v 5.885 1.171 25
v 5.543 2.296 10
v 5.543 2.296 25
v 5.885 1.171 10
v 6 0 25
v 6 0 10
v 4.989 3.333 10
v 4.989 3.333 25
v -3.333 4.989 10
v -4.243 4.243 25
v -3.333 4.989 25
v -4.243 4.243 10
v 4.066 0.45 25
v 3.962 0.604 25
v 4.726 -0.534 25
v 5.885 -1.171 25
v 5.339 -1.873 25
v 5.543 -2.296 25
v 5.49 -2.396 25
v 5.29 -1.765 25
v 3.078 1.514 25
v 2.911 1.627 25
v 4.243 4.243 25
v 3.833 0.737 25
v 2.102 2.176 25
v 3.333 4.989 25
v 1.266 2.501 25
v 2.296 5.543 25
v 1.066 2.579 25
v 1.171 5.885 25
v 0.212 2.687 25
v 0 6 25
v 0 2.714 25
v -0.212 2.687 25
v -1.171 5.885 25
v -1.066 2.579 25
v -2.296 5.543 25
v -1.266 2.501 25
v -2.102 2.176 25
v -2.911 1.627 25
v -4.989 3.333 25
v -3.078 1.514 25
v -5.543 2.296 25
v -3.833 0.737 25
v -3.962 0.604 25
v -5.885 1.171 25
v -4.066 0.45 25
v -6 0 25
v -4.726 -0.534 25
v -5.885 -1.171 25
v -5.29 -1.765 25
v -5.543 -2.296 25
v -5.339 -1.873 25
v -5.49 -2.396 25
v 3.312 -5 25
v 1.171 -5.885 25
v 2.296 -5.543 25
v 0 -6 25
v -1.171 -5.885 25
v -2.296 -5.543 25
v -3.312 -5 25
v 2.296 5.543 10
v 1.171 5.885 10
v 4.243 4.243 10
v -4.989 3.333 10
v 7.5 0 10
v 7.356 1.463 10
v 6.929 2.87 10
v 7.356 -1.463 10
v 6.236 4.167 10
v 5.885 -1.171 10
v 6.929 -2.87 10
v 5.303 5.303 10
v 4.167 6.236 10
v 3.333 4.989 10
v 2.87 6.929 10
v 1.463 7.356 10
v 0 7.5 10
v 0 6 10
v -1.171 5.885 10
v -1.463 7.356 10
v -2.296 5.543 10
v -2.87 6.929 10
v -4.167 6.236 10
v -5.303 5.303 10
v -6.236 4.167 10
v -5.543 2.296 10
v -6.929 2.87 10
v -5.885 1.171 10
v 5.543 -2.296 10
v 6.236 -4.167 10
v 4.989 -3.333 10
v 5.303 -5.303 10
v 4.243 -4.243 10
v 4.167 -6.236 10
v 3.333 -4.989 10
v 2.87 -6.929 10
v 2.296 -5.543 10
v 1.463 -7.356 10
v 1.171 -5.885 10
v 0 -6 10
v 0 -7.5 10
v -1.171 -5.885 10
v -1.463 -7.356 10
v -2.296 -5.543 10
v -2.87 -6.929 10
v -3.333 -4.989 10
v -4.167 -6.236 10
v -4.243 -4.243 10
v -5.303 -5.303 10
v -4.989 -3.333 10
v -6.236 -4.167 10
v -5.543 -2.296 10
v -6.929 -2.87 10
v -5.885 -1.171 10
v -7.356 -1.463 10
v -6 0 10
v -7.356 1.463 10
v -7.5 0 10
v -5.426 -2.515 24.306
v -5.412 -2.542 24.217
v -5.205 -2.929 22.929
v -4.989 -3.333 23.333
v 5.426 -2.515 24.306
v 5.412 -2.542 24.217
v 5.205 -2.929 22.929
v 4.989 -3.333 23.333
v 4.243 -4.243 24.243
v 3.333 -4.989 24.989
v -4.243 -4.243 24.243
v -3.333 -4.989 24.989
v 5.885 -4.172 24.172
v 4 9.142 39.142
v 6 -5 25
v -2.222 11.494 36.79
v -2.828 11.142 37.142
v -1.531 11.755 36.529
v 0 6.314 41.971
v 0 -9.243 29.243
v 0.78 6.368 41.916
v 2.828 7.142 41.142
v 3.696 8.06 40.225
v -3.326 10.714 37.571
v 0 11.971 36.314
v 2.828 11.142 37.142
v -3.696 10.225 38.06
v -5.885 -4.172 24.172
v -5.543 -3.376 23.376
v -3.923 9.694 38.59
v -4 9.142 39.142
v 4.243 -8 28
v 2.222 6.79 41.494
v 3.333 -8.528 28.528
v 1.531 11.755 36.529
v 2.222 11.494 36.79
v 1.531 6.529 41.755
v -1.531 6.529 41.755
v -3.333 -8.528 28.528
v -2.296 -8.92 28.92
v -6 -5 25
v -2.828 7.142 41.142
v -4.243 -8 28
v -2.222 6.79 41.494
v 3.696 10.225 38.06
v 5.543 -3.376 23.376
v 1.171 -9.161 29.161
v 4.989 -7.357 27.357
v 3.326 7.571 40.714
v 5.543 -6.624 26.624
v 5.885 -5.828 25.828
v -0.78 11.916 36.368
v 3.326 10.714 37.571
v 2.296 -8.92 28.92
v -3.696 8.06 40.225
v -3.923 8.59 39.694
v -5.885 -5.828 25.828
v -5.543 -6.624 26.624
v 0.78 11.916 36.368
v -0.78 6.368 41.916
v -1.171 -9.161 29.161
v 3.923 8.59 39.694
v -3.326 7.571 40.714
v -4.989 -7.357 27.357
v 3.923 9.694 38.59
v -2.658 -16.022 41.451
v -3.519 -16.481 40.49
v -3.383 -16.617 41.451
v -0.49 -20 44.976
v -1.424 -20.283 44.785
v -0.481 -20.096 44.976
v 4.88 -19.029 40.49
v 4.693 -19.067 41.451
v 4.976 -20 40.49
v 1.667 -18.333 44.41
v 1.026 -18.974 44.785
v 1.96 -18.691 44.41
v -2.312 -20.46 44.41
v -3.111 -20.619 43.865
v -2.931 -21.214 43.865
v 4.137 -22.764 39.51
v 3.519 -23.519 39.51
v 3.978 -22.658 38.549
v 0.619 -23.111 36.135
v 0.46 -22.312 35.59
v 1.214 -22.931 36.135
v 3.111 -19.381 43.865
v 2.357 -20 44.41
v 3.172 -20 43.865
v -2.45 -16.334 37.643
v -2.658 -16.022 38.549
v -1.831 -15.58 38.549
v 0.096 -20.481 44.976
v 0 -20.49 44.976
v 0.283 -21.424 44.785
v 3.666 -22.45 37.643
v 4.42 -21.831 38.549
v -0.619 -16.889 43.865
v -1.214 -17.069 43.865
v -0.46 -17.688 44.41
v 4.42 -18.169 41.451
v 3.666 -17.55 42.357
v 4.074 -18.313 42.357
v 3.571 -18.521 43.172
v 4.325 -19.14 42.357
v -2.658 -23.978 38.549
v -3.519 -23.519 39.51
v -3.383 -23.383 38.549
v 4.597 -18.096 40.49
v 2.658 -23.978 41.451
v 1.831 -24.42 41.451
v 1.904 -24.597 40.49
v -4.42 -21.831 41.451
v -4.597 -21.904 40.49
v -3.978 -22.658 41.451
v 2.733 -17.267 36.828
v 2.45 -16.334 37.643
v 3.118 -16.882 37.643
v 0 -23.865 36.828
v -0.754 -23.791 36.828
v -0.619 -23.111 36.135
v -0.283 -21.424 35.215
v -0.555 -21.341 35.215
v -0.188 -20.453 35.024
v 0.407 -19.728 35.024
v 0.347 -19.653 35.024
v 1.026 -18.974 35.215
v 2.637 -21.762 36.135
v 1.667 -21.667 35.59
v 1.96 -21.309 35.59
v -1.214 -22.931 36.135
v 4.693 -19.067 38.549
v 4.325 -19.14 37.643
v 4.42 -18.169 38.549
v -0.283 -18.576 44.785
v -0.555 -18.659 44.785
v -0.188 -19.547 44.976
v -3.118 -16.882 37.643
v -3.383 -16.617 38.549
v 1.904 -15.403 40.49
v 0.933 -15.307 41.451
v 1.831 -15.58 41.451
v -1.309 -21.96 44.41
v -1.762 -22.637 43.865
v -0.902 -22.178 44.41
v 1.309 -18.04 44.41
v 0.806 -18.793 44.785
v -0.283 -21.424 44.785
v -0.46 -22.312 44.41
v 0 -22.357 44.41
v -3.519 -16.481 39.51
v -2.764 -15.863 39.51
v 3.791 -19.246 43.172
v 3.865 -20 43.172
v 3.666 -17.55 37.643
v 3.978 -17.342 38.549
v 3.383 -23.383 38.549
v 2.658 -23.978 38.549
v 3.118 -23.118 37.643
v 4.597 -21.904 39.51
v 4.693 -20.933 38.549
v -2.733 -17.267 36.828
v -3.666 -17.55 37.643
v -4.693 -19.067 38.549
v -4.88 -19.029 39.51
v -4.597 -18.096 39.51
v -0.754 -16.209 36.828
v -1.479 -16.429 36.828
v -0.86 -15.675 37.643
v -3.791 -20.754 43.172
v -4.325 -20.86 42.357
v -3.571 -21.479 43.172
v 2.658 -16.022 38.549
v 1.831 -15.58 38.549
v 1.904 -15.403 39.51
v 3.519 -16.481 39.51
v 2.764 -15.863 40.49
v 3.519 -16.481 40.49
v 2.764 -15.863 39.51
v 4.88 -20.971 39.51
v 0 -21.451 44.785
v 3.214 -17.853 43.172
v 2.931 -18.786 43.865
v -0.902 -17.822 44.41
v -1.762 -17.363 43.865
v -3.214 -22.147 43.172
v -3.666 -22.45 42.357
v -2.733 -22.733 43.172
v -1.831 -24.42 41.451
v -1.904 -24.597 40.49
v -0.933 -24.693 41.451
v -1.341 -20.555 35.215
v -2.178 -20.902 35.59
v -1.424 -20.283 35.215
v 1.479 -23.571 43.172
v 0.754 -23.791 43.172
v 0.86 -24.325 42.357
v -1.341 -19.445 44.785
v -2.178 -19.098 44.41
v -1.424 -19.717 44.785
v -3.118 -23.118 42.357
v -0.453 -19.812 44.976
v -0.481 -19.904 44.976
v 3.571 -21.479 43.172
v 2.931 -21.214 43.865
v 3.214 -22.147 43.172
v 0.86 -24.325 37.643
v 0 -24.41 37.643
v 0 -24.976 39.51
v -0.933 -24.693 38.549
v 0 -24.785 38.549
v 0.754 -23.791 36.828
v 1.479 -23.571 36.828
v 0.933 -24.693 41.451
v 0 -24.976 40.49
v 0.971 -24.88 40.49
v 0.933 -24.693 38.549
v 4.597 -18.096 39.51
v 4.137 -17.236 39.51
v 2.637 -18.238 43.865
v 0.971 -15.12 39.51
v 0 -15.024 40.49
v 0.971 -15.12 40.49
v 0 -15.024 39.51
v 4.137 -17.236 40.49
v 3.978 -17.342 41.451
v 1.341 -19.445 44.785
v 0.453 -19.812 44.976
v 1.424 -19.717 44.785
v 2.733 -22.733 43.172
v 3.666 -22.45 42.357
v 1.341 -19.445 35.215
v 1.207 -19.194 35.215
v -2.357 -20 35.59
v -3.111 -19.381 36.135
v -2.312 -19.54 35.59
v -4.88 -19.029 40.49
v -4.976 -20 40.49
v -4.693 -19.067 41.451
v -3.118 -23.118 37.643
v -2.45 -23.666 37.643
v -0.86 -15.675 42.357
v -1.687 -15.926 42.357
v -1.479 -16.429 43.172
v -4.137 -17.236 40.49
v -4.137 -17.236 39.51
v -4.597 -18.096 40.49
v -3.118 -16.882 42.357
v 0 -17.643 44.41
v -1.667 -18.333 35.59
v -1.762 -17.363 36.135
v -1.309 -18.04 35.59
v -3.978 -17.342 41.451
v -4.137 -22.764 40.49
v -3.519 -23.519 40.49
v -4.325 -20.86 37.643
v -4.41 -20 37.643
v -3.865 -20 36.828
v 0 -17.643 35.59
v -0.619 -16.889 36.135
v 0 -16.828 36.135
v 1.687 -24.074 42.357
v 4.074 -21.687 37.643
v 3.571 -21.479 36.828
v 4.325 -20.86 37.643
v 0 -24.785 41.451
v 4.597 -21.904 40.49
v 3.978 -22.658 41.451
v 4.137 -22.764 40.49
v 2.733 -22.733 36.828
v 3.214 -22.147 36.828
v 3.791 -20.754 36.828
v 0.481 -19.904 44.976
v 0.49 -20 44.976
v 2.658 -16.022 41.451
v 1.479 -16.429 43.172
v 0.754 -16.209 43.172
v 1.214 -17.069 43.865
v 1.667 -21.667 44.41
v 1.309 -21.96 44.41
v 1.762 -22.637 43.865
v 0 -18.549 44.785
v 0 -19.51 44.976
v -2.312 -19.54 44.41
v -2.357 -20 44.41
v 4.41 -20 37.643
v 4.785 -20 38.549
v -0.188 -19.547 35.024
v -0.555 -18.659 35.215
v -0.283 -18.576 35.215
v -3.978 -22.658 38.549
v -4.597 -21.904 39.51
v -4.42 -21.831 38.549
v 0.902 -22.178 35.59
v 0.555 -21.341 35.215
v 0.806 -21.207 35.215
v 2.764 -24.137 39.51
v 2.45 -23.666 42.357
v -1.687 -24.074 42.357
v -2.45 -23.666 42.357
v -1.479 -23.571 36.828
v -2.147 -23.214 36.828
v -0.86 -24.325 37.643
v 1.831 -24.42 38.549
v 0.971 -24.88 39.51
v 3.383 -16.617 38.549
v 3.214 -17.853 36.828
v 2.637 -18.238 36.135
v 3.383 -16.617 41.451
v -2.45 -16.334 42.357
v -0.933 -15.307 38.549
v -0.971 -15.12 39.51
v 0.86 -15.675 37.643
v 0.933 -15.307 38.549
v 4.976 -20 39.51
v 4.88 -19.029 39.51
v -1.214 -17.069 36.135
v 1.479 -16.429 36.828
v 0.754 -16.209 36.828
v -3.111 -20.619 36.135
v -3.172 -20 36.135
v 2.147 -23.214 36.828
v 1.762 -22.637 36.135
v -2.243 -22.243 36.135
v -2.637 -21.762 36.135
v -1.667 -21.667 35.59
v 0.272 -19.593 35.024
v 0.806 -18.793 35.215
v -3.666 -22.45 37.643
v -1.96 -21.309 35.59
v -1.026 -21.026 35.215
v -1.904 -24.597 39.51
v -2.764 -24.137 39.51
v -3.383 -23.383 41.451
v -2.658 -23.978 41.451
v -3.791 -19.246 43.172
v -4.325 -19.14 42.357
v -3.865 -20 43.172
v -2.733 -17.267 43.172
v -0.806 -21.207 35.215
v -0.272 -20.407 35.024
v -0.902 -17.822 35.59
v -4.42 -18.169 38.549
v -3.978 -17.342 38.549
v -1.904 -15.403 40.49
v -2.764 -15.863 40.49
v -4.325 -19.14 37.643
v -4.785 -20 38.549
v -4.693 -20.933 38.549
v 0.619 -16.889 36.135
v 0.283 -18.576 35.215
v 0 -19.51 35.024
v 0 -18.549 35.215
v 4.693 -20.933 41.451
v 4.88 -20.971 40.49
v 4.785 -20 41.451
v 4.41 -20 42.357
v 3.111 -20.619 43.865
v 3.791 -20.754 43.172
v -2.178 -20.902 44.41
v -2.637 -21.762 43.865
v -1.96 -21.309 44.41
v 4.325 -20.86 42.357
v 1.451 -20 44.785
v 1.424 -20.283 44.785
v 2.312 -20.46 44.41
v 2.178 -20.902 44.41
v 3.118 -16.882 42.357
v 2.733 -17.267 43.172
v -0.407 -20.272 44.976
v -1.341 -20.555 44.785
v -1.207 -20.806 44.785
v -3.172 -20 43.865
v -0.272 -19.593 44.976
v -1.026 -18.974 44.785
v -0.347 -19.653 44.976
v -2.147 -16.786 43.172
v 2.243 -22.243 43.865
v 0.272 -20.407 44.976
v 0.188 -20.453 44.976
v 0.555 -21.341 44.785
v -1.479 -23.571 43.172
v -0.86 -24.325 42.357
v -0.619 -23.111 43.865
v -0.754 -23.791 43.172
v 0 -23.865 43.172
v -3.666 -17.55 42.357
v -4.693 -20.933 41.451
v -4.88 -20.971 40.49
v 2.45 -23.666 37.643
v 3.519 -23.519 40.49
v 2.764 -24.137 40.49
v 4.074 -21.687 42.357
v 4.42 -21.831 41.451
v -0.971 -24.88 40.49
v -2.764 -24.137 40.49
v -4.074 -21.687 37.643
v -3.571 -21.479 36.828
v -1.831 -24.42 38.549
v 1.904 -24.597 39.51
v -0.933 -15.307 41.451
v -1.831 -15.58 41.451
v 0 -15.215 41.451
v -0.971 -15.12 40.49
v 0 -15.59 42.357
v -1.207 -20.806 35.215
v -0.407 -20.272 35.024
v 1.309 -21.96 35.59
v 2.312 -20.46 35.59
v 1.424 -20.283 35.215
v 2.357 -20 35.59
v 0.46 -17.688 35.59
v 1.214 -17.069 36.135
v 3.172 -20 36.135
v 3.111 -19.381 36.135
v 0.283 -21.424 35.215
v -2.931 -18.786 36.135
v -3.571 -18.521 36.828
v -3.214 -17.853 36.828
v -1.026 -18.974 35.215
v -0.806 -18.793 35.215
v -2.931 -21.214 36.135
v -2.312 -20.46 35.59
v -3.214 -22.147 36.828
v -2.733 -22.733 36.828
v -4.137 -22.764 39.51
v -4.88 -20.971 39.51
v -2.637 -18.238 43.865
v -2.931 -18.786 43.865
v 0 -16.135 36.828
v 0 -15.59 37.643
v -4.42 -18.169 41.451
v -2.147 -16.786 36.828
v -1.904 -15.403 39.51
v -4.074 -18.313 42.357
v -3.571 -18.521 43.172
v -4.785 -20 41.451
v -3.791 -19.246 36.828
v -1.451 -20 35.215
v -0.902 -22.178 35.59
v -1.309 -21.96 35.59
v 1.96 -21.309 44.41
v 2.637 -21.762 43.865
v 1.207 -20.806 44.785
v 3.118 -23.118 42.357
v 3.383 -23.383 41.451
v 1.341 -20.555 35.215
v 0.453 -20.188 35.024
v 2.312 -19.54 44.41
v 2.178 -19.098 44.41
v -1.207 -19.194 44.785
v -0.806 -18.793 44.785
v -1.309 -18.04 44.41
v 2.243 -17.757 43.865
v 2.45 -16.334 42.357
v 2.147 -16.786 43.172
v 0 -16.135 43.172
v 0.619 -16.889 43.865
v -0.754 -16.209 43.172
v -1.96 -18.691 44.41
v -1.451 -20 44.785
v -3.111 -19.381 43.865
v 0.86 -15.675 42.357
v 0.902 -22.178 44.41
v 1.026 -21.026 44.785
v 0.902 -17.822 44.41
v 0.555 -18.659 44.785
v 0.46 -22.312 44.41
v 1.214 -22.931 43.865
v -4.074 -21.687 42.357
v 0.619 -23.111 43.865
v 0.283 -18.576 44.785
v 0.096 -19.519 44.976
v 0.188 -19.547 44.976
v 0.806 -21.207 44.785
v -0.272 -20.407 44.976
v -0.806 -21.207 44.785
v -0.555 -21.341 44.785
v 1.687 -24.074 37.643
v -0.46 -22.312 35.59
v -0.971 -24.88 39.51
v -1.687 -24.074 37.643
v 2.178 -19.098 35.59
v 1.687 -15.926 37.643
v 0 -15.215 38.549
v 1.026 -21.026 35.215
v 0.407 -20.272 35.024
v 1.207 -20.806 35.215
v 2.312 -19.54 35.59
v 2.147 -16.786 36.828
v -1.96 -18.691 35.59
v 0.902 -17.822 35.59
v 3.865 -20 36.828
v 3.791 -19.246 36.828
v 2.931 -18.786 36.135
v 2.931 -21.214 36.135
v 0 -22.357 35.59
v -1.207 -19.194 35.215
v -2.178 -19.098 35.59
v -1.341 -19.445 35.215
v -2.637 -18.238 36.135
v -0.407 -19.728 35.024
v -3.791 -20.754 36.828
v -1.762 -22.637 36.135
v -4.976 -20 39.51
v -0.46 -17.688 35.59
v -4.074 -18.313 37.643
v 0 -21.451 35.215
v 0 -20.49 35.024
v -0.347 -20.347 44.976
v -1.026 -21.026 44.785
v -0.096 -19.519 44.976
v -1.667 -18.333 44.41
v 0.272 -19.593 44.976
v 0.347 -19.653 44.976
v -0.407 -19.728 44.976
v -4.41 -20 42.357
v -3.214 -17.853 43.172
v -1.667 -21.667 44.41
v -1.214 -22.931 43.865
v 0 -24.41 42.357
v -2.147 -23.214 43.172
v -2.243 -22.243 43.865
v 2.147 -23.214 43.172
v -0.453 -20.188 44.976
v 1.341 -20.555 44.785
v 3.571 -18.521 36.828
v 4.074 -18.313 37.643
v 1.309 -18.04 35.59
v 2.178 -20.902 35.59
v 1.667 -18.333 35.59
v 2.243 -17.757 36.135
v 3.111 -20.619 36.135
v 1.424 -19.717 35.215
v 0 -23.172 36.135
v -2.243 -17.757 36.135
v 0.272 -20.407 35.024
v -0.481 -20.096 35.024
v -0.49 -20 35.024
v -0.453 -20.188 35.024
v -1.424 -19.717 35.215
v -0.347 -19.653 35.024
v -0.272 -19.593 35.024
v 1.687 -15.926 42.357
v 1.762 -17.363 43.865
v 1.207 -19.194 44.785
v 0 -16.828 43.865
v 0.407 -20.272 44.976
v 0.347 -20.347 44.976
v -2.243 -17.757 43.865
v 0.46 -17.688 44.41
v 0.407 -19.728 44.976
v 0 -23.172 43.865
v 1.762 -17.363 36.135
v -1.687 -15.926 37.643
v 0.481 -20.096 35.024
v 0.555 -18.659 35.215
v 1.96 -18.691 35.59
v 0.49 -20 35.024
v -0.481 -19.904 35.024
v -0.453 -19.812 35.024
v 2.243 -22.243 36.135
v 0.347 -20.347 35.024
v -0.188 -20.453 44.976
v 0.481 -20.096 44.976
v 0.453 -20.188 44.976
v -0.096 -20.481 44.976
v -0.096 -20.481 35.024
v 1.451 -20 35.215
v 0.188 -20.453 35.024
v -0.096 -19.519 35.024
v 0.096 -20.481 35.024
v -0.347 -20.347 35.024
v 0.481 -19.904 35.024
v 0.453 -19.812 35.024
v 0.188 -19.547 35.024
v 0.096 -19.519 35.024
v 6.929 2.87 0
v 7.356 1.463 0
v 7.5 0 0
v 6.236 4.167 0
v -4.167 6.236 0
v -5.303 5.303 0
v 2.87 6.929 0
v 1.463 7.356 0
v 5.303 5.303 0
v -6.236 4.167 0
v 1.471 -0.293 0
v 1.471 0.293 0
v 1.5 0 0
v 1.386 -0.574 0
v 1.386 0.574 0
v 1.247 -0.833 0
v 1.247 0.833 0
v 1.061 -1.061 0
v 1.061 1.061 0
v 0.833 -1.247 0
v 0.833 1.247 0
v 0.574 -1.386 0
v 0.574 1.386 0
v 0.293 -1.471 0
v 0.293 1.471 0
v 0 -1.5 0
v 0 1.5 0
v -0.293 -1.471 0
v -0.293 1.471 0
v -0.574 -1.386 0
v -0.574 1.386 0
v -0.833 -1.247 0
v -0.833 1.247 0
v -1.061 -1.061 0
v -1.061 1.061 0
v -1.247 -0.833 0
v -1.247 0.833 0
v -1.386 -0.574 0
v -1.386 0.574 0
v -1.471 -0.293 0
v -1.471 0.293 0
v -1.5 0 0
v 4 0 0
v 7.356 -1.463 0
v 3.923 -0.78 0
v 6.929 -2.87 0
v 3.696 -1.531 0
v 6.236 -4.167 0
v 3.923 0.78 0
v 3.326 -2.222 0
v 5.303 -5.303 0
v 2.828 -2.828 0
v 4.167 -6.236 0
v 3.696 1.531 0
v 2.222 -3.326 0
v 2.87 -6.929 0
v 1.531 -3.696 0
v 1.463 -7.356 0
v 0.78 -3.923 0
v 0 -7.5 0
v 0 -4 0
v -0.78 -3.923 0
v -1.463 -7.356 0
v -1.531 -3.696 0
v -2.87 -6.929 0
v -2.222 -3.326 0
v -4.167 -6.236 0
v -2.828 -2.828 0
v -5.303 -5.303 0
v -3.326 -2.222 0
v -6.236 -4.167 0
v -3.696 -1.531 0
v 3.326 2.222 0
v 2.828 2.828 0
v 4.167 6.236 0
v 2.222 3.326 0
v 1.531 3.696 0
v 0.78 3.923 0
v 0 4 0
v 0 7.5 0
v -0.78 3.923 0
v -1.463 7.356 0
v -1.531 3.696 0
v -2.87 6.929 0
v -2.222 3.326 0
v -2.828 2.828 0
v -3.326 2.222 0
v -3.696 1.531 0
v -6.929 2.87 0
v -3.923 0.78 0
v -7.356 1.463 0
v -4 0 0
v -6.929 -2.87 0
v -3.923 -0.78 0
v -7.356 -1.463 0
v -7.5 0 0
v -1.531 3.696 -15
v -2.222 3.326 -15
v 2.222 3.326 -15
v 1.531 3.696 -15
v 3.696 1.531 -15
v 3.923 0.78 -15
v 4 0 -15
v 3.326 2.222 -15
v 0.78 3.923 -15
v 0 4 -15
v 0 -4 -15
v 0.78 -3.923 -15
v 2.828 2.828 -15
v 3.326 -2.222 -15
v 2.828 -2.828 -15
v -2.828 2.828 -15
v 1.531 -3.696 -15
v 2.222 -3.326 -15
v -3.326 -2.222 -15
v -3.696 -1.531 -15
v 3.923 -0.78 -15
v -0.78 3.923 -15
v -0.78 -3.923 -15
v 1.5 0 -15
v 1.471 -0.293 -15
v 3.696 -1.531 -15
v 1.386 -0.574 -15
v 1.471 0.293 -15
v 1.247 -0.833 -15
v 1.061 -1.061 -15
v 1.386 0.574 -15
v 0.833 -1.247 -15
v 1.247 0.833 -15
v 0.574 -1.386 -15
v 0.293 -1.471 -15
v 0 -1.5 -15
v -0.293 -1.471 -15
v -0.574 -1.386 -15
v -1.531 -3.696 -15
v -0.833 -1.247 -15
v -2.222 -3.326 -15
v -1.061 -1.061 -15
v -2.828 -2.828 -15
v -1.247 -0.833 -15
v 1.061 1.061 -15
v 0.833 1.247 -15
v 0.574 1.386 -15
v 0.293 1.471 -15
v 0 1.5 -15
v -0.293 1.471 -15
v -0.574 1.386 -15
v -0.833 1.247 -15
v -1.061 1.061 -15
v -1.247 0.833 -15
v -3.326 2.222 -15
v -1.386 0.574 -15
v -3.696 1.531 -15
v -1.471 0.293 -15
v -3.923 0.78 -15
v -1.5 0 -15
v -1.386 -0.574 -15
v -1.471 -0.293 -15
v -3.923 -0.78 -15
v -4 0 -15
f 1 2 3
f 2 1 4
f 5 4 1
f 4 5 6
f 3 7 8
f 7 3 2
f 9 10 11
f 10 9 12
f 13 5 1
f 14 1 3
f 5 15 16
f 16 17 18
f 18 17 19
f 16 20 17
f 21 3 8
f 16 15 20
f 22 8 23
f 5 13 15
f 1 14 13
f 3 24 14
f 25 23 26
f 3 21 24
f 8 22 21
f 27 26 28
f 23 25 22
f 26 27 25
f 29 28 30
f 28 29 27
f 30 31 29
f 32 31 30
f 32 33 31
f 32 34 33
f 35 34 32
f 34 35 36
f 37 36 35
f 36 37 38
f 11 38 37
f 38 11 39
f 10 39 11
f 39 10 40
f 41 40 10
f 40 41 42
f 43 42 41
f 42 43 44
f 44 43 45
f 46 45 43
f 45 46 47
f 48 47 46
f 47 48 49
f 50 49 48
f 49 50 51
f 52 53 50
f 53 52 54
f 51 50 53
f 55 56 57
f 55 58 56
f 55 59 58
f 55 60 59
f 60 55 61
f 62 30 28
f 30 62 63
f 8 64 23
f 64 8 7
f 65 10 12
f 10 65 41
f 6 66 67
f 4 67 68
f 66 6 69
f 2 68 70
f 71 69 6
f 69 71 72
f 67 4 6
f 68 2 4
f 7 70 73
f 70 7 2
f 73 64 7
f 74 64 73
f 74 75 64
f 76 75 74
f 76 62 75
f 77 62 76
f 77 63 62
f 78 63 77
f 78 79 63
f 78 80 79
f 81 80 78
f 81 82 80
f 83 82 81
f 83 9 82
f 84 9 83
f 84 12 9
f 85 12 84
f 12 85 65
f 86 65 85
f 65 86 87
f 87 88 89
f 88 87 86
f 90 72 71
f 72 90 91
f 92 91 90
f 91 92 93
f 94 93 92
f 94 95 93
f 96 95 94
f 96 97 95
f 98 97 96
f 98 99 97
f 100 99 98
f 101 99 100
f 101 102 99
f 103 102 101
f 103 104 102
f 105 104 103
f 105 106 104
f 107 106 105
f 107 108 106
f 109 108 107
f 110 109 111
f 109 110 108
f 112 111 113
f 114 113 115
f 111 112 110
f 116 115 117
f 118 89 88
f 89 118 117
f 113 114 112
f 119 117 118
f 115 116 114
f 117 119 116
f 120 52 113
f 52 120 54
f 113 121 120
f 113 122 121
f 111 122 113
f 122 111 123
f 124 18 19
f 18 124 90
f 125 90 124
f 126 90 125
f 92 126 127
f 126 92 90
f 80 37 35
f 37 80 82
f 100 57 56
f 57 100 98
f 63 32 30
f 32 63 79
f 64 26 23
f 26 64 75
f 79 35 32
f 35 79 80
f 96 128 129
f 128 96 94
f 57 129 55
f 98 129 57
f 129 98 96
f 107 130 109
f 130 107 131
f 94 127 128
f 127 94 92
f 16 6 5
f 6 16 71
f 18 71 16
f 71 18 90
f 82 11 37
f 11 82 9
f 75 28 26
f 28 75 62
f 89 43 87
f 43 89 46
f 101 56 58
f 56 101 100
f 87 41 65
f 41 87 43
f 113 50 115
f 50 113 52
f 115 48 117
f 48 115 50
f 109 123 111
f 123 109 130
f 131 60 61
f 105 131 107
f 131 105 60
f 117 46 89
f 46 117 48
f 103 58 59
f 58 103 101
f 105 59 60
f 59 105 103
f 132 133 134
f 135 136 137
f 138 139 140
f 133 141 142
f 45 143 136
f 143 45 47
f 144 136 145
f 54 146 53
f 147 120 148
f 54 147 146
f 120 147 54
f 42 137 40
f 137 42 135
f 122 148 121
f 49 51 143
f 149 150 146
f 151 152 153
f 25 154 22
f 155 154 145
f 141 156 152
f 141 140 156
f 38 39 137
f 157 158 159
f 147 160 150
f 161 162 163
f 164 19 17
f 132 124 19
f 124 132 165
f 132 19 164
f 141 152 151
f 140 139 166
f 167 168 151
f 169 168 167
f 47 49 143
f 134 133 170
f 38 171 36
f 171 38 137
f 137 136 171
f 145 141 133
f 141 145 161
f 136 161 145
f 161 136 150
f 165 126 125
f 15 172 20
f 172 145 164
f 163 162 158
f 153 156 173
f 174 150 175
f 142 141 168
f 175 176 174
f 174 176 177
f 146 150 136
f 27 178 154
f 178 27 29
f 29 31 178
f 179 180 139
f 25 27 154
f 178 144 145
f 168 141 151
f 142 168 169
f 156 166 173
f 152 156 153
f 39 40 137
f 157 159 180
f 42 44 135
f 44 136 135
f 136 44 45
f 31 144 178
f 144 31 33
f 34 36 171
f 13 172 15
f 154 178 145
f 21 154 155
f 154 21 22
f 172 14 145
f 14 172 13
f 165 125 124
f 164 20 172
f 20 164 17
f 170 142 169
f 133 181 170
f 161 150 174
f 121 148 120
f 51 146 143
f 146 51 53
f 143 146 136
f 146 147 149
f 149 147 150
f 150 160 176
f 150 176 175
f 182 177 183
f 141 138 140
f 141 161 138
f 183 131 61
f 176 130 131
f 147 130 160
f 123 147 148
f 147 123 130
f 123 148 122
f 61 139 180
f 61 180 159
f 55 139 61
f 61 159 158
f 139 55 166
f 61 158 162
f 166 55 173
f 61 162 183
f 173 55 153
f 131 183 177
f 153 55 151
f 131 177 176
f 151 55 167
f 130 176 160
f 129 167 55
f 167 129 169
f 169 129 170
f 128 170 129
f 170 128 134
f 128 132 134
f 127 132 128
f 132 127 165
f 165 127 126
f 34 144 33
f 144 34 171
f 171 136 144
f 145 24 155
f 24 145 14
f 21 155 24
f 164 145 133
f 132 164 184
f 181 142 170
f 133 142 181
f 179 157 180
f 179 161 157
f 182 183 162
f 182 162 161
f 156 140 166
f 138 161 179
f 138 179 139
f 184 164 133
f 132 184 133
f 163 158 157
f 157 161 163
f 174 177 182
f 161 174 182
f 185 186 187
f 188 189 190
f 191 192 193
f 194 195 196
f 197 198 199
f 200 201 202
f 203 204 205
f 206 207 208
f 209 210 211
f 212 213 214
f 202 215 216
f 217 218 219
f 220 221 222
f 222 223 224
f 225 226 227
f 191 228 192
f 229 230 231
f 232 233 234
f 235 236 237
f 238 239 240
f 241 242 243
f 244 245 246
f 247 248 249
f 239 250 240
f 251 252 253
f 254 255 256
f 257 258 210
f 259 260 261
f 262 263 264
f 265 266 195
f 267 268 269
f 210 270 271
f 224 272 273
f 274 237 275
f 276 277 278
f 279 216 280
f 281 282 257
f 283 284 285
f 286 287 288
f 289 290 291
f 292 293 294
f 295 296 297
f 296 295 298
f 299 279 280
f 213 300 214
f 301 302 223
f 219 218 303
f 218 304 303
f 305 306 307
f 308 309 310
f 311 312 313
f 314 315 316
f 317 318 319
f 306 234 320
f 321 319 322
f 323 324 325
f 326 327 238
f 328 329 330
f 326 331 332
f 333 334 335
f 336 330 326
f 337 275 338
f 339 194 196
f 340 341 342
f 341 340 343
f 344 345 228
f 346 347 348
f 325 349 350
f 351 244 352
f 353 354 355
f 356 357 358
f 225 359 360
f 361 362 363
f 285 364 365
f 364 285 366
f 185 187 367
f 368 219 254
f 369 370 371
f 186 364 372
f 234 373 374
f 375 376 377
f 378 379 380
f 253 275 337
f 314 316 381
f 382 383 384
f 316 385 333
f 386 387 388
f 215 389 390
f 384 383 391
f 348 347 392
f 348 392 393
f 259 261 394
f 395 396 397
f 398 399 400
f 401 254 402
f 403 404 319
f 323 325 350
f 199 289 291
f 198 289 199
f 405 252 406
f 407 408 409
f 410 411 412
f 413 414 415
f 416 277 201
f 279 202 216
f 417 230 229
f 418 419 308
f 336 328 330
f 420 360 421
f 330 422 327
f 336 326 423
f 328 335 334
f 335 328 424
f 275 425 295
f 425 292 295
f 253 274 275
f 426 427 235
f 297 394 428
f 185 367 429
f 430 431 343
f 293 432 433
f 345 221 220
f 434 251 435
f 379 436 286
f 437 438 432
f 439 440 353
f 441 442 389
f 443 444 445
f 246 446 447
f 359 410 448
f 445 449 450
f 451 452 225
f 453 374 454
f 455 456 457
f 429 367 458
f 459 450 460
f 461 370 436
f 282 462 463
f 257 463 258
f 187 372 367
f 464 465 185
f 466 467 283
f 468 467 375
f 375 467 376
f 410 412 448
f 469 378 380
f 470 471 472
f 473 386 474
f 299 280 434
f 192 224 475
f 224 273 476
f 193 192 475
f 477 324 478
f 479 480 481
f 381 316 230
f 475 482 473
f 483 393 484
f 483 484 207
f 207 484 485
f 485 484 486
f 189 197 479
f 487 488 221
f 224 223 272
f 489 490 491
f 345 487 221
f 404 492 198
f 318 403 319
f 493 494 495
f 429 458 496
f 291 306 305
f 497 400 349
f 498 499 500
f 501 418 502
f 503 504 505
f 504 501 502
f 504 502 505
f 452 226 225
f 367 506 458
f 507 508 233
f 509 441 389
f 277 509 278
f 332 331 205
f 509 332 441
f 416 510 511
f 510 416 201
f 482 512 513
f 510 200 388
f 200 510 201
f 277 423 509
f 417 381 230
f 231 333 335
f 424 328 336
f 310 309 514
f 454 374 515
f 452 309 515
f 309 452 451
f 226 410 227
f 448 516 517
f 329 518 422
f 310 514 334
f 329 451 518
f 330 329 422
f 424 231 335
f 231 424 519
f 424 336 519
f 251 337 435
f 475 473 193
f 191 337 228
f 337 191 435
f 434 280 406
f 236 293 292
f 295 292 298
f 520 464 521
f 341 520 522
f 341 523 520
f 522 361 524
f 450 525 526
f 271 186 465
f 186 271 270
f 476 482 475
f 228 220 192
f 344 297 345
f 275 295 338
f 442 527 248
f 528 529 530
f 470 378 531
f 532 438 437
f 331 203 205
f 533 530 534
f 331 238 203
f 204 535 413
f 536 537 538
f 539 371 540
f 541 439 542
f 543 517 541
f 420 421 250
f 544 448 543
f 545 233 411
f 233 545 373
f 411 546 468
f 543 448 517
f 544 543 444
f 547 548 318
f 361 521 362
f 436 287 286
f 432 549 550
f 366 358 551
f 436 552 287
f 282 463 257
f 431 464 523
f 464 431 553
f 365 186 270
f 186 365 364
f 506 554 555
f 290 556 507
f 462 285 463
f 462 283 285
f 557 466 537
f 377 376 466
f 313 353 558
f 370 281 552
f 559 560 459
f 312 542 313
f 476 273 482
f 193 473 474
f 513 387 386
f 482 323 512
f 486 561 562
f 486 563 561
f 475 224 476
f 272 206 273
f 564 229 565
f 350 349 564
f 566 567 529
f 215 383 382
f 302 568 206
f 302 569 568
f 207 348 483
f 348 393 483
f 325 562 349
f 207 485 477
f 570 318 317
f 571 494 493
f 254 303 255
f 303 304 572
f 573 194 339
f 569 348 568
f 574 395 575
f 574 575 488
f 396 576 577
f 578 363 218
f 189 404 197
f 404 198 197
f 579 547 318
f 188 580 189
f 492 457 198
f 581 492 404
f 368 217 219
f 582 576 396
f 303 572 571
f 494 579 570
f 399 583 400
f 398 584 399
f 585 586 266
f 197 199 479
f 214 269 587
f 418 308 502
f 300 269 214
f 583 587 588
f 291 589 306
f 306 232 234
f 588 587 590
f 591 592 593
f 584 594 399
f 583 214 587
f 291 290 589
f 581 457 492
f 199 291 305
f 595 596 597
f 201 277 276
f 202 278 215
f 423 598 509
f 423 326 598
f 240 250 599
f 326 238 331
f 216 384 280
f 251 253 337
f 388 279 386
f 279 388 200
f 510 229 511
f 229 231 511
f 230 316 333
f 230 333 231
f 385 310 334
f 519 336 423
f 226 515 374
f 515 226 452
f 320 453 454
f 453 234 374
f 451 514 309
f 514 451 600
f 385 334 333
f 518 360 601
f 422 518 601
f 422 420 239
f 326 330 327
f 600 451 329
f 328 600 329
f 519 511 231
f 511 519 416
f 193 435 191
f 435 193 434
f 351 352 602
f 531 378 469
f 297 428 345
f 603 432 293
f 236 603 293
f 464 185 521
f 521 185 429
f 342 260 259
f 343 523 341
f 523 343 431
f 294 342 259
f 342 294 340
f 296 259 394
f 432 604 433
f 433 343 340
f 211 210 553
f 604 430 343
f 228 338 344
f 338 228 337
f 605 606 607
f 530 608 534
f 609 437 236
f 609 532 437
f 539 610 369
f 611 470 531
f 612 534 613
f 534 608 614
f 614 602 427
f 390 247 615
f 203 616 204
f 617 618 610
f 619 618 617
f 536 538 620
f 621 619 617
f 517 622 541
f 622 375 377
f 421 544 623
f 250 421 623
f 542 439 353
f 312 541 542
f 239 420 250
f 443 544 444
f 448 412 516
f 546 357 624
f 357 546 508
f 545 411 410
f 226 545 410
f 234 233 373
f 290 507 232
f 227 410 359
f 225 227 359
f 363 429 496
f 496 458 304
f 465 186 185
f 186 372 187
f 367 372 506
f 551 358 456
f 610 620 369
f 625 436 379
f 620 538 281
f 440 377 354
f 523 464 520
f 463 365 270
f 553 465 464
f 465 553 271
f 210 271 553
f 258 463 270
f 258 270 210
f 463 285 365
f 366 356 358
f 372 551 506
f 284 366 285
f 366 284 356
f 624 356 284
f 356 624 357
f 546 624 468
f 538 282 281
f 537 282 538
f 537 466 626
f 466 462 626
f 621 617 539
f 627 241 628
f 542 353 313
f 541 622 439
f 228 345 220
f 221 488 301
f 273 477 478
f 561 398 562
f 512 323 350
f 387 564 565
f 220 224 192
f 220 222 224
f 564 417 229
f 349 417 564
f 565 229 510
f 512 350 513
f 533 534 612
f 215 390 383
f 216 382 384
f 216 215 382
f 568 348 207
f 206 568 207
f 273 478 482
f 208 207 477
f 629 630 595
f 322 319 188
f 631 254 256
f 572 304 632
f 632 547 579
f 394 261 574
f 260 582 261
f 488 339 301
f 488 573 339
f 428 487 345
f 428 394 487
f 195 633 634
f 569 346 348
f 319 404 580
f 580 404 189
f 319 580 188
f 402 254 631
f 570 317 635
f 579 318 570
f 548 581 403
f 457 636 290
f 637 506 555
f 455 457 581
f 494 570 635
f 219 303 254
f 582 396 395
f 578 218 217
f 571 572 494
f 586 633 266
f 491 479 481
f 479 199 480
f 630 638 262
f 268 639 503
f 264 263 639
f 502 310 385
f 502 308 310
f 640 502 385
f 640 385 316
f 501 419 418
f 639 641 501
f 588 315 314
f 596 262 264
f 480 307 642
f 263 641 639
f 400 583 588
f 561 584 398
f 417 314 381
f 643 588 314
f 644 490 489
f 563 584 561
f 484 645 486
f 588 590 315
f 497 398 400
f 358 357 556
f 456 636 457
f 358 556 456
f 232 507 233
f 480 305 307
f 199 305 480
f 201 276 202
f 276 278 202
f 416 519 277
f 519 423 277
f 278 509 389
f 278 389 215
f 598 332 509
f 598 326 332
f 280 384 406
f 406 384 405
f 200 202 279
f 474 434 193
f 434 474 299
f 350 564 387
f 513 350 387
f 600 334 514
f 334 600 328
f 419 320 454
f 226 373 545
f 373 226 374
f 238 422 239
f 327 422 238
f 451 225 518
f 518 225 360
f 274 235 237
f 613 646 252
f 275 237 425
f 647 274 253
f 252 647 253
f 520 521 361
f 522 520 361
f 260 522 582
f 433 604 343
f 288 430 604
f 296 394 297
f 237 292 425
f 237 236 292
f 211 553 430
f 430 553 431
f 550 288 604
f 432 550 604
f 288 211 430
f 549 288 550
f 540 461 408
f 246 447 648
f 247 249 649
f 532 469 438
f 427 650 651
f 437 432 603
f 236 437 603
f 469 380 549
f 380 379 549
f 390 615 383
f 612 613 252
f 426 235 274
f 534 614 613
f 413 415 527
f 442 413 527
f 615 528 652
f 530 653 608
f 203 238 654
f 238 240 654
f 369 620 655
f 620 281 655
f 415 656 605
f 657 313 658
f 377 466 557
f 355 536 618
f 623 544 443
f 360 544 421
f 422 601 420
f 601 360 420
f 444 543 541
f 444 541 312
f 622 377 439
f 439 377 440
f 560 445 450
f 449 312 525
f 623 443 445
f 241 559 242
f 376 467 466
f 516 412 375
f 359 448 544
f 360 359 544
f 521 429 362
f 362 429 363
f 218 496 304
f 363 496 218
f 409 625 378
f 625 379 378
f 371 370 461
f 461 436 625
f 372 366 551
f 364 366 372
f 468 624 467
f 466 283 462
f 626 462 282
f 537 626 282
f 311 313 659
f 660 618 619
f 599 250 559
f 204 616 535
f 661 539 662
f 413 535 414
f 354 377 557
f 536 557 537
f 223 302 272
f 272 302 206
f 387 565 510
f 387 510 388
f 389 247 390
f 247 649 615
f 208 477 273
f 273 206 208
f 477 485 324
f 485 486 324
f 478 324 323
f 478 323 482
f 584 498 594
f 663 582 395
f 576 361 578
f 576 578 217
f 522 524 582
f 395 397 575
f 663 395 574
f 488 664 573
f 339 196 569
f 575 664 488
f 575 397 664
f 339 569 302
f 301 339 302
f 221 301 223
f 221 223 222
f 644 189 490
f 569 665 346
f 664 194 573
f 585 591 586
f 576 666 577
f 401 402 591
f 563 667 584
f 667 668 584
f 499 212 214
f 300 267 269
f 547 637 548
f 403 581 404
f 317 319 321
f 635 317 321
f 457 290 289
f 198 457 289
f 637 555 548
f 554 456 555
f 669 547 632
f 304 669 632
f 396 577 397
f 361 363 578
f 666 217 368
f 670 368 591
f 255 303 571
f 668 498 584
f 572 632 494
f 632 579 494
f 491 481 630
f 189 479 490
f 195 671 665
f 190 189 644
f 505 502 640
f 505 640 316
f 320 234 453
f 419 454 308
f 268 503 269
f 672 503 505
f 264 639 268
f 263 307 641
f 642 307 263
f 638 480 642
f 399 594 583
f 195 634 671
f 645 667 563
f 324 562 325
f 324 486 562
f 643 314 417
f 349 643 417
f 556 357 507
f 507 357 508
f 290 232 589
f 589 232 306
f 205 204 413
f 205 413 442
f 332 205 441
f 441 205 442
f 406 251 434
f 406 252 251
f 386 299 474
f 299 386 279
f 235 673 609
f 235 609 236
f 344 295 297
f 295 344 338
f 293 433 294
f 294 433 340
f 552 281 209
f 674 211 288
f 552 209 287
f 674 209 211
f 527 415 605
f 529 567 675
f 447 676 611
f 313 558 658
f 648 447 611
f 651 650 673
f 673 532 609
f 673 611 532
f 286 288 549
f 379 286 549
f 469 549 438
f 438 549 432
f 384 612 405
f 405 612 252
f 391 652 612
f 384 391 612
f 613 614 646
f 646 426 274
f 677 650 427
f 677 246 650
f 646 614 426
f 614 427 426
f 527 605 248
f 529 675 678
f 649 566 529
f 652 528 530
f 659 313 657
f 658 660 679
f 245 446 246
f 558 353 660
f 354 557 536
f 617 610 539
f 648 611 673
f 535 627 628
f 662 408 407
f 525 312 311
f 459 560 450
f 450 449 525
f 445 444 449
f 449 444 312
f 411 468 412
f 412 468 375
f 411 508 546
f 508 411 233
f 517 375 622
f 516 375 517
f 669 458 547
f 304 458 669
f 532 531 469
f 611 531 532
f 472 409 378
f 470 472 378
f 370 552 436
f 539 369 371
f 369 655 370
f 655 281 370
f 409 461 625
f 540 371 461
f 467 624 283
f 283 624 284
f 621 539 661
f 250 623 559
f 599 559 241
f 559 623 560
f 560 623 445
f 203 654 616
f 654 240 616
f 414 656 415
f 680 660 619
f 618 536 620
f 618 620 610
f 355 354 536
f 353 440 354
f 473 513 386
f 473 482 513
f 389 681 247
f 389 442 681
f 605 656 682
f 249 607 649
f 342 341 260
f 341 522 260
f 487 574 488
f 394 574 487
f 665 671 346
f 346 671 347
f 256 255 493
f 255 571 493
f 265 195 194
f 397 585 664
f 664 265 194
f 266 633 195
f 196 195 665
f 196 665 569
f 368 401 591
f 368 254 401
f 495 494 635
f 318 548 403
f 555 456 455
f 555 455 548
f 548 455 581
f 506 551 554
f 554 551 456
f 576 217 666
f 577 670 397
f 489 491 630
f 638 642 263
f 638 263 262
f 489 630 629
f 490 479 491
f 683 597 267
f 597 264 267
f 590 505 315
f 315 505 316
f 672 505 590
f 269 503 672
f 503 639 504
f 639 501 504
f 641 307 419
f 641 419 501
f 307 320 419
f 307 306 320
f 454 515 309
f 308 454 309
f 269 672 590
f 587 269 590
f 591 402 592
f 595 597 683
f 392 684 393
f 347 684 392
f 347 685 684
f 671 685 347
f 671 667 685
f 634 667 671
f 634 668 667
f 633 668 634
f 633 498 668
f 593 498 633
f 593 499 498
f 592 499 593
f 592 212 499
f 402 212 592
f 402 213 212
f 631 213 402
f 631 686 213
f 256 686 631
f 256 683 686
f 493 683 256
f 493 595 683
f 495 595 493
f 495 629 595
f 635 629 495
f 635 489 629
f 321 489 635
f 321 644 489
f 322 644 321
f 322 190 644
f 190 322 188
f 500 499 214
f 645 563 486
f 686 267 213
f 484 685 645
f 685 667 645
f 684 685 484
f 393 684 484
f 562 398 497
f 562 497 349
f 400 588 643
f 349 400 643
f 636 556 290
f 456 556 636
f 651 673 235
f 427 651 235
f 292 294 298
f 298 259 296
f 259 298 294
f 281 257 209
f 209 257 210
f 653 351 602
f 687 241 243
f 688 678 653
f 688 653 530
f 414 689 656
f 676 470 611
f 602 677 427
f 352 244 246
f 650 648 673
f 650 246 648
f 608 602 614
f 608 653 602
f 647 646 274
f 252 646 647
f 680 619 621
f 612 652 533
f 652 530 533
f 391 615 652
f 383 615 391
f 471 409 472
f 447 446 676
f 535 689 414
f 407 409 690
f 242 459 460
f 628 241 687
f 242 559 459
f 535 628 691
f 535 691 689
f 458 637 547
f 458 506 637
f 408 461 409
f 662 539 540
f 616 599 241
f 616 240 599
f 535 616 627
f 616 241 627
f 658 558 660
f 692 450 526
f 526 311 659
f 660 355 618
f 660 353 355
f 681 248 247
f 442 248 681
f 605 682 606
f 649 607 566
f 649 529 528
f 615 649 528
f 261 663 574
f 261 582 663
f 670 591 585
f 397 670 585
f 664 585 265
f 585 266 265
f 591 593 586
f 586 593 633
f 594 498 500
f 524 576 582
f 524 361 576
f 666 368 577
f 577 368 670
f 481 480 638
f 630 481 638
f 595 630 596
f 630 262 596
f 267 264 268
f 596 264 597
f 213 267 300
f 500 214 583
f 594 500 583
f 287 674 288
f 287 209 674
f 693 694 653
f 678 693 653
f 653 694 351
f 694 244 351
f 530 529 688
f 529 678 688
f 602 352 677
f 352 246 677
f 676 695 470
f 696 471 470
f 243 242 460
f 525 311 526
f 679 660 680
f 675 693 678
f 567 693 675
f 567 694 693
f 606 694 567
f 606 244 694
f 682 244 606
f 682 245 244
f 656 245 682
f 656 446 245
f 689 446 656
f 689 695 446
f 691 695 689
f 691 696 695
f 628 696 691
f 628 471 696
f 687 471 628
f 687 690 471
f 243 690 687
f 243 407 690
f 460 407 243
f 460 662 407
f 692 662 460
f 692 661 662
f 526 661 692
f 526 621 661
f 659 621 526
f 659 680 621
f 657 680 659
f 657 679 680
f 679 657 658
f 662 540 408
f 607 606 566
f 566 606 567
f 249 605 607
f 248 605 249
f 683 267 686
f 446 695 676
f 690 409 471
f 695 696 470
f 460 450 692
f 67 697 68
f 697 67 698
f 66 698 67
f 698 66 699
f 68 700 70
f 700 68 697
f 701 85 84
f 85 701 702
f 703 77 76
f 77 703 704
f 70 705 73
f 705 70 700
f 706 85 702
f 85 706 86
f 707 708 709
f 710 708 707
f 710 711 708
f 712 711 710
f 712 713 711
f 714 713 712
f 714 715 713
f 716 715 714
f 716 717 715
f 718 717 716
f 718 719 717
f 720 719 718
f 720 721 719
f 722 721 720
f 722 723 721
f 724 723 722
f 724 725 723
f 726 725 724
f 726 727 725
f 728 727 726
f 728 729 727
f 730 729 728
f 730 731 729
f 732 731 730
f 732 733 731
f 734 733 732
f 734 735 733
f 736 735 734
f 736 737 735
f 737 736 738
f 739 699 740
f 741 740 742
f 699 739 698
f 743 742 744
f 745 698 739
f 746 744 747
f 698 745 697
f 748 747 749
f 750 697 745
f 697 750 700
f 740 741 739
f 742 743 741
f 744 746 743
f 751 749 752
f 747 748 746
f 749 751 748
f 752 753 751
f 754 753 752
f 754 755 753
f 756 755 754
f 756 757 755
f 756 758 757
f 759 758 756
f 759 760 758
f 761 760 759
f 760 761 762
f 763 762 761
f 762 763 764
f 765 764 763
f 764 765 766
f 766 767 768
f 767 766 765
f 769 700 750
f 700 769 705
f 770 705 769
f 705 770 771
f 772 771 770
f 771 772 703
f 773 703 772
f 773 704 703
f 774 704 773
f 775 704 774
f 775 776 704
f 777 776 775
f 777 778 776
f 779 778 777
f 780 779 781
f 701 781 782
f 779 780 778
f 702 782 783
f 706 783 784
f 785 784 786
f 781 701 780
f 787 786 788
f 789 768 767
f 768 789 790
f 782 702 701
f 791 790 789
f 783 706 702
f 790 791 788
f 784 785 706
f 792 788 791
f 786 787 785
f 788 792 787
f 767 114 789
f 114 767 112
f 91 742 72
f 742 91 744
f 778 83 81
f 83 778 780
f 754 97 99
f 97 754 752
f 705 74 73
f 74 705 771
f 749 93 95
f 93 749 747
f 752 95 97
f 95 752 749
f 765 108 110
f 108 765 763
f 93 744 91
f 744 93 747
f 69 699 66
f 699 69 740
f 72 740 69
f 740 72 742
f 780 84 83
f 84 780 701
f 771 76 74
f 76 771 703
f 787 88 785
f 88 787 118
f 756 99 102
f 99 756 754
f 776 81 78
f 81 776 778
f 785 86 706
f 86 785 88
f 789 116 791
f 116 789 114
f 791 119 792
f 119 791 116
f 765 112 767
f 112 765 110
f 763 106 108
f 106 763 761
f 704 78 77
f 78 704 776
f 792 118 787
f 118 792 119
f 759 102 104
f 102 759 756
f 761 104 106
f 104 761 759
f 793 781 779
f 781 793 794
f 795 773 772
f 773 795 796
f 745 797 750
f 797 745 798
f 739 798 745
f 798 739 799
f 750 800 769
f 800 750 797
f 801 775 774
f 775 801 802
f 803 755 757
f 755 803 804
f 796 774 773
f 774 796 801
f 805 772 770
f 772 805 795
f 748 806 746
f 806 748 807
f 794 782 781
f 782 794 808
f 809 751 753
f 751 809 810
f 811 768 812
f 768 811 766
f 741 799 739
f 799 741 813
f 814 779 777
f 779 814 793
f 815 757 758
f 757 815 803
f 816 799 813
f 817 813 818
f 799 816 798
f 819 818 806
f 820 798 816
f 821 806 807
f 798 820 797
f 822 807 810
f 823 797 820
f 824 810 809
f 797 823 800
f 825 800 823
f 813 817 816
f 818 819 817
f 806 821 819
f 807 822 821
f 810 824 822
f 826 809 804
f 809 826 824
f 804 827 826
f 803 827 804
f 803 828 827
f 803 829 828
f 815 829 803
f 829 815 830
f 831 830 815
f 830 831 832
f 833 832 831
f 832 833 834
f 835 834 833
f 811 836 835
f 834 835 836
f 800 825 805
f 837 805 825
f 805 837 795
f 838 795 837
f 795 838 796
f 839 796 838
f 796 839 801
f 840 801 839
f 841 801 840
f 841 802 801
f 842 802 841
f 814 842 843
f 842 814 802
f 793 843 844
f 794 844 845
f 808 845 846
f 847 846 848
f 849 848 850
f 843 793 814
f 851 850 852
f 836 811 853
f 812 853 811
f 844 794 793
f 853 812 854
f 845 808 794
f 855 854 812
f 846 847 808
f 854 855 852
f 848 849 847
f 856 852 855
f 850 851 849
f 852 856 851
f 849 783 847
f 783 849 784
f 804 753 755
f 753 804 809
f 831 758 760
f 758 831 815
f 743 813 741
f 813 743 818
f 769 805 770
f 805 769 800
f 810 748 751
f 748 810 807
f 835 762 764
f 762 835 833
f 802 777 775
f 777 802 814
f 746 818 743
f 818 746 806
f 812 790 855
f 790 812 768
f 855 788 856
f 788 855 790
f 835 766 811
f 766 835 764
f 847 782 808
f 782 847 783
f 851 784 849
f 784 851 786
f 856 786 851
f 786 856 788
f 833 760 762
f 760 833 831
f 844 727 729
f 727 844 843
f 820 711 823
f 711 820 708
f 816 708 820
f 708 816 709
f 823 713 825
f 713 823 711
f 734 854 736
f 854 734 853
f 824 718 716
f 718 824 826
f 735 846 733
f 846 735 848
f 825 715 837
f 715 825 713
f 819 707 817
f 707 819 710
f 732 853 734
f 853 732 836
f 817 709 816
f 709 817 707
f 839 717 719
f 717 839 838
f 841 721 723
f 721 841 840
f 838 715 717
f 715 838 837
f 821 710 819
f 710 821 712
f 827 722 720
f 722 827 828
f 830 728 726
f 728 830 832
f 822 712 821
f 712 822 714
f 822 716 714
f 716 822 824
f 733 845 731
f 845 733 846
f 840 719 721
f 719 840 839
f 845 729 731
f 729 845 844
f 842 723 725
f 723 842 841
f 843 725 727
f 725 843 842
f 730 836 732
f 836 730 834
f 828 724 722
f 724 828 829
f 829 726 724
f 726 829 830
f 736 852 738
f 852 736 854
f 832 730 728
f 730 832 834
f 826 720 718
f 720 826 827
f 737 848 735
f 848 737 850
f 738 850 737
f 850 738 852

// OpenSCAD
/**
 * コロ助ロボット - 丁髷（ちょんまげ）
 * Corosuke Robot - Topknot (Chonmage)
 *
 * コロ助の特徴的な丁髷
 * - 江戸時代風のデザイン
 * - 頭頂部に取り付け
 */

// =============================================================================
// パラメータ
// =============================================================================

// 髷の基部
base_diameter = 15;
base_height = 10;

// 髷本体
topknot_length = 35;
topknot_width = 12;
topknot_height = 8;

// 髪の毛部分（下側の横に広がる部分）
hair_width = 50;
hair_depth = 30;
hair_height = 5;

// 取り付け軸
mount_diameter = 8;
mount_height = 15;

// =============================================================================
// モジュール: 丁髷の基部
// =============================================================================
module topknot_base() {
    // 髷を結ぶ部分
    cylinder(h = base_height, d1 = base_diameter + 5, d2 = base_diameter, $fn = 32);

    // 紐の表現（装飾リング）
    translate([0, 0, base_height/2])
        difference() {
            cylinder(h = 3, d = base_diameter + 2, $fn = 32);
            translate([0, 0, -1])
                cylinder(h = 5, d = base_diameter - 2, $fn = 32);
        }
}

// =============================================================================
// モジュール: 髷本体（上に伸びる部分）
// =============================================================================
module topknot_body() {
    translate([0, 0, base_height]) {
        // 髷の曲がった部分
        rotate([0, -20, 0]) {
            // 根本
            hull() {
                cylinder(h = 5, d = topknot_width, $fn = 32);
                translate([0, 0, topknot_length * 0.4])
                    rotate([0, 30, 0])
                        cylinder(h = 5, d = topknot_width - 2, $fn = 32);
            }

            // 先端（前に曲がる）
            translate([0, 0, topknot_length * 0.4])
                rotate([0, 30, 0]) {
                    hull() {
                        cylinder(h = 5, d = topknot_width - 2, $fn = 32);
                        translate([topknot_length * 0.3, 0, topknot_length * 0.3])
                            sphere(d = topknot_width - 4, $fn = 32);
                    }

                    // 髷の先端
                    translate([topknot_length * 0.3, 0, topknot_length * 0.3])
                        sphere(d = topknot_width - 2, $fn = 32);
                }
        }
    }
}

// =============================================================================
// モジュール: 横に広がる髪の毛
// =============================================================================
module side_hair() {
    // 左右に広がる髪
    translate([0, 0, -3]) {
        // 右側
        translate([5, 0, 0])
            scale([1, 0.6, 0.3])
                rotate([0, 30, 0])
                    sphere(d = hair_width * 0.6, $fn = 32);

        // 左側
        translate([-5, 0, 0])
            scale([1, 0.6, 0.3])
                rotate([0, -30, 0])
                    sphere(d = hair_width * 0.6, $fn = 32);
    }
}

// =============================================================================
// モジュール: 取り付け軸
// =============================================================================
module mount_shaft() {
    translate([0, 0, -mount_height]) {
        difference() {
            cylinder(h = mount_height, d = mount_diameter, $fn = 32);
            // ネジ穴
            cylinder(h = mount_height + 1, d = 3, $fn = 32);
        }
    }
}

// =============================================================================
// モジュール: 完全な丁髷
// =============================================================================
module complete_topknot() {
    color("black") {
        topknot_base();
        topknot_body();
        side_hair();
    }

    color("gray")
        mount_shaft();
}

// =============================================================================
// モジュール: 丁髷（簡易版 - 印刷しやすい）
// =============================================================================
module simple_topknot() {
    color("black") {
        // 基部
        cylinder(h = base_height, d = base_diameter, $fn = 32);

        // 髷本体（単純な曲がった円柱）
        translate([0, 0, base_height]) {
            // 根本部分
            cylinder(h = 15, d = topknot_width, $fn = 32);

            // 曲がった先端部分
            translate([0, -5, 15])
                rotate([-45, 0, 0])
                    cylinder(h = 20, d1 = topknot_width, d2 = topknot_width - 4, $fn = 32);

            // 先端の丸み
            translate([0, -20, 30])
                sphere(d = topknot_width - 2, $fn = 32);
        }
    }

    // 取り付け軸
    color("gray")
        mount_shaft();
}

// =============================================================================
// 出力
// =============================================================================

// 詳細版
// complete_topknot();

// 簡易版（印刷推奨）
simple_topknot();
